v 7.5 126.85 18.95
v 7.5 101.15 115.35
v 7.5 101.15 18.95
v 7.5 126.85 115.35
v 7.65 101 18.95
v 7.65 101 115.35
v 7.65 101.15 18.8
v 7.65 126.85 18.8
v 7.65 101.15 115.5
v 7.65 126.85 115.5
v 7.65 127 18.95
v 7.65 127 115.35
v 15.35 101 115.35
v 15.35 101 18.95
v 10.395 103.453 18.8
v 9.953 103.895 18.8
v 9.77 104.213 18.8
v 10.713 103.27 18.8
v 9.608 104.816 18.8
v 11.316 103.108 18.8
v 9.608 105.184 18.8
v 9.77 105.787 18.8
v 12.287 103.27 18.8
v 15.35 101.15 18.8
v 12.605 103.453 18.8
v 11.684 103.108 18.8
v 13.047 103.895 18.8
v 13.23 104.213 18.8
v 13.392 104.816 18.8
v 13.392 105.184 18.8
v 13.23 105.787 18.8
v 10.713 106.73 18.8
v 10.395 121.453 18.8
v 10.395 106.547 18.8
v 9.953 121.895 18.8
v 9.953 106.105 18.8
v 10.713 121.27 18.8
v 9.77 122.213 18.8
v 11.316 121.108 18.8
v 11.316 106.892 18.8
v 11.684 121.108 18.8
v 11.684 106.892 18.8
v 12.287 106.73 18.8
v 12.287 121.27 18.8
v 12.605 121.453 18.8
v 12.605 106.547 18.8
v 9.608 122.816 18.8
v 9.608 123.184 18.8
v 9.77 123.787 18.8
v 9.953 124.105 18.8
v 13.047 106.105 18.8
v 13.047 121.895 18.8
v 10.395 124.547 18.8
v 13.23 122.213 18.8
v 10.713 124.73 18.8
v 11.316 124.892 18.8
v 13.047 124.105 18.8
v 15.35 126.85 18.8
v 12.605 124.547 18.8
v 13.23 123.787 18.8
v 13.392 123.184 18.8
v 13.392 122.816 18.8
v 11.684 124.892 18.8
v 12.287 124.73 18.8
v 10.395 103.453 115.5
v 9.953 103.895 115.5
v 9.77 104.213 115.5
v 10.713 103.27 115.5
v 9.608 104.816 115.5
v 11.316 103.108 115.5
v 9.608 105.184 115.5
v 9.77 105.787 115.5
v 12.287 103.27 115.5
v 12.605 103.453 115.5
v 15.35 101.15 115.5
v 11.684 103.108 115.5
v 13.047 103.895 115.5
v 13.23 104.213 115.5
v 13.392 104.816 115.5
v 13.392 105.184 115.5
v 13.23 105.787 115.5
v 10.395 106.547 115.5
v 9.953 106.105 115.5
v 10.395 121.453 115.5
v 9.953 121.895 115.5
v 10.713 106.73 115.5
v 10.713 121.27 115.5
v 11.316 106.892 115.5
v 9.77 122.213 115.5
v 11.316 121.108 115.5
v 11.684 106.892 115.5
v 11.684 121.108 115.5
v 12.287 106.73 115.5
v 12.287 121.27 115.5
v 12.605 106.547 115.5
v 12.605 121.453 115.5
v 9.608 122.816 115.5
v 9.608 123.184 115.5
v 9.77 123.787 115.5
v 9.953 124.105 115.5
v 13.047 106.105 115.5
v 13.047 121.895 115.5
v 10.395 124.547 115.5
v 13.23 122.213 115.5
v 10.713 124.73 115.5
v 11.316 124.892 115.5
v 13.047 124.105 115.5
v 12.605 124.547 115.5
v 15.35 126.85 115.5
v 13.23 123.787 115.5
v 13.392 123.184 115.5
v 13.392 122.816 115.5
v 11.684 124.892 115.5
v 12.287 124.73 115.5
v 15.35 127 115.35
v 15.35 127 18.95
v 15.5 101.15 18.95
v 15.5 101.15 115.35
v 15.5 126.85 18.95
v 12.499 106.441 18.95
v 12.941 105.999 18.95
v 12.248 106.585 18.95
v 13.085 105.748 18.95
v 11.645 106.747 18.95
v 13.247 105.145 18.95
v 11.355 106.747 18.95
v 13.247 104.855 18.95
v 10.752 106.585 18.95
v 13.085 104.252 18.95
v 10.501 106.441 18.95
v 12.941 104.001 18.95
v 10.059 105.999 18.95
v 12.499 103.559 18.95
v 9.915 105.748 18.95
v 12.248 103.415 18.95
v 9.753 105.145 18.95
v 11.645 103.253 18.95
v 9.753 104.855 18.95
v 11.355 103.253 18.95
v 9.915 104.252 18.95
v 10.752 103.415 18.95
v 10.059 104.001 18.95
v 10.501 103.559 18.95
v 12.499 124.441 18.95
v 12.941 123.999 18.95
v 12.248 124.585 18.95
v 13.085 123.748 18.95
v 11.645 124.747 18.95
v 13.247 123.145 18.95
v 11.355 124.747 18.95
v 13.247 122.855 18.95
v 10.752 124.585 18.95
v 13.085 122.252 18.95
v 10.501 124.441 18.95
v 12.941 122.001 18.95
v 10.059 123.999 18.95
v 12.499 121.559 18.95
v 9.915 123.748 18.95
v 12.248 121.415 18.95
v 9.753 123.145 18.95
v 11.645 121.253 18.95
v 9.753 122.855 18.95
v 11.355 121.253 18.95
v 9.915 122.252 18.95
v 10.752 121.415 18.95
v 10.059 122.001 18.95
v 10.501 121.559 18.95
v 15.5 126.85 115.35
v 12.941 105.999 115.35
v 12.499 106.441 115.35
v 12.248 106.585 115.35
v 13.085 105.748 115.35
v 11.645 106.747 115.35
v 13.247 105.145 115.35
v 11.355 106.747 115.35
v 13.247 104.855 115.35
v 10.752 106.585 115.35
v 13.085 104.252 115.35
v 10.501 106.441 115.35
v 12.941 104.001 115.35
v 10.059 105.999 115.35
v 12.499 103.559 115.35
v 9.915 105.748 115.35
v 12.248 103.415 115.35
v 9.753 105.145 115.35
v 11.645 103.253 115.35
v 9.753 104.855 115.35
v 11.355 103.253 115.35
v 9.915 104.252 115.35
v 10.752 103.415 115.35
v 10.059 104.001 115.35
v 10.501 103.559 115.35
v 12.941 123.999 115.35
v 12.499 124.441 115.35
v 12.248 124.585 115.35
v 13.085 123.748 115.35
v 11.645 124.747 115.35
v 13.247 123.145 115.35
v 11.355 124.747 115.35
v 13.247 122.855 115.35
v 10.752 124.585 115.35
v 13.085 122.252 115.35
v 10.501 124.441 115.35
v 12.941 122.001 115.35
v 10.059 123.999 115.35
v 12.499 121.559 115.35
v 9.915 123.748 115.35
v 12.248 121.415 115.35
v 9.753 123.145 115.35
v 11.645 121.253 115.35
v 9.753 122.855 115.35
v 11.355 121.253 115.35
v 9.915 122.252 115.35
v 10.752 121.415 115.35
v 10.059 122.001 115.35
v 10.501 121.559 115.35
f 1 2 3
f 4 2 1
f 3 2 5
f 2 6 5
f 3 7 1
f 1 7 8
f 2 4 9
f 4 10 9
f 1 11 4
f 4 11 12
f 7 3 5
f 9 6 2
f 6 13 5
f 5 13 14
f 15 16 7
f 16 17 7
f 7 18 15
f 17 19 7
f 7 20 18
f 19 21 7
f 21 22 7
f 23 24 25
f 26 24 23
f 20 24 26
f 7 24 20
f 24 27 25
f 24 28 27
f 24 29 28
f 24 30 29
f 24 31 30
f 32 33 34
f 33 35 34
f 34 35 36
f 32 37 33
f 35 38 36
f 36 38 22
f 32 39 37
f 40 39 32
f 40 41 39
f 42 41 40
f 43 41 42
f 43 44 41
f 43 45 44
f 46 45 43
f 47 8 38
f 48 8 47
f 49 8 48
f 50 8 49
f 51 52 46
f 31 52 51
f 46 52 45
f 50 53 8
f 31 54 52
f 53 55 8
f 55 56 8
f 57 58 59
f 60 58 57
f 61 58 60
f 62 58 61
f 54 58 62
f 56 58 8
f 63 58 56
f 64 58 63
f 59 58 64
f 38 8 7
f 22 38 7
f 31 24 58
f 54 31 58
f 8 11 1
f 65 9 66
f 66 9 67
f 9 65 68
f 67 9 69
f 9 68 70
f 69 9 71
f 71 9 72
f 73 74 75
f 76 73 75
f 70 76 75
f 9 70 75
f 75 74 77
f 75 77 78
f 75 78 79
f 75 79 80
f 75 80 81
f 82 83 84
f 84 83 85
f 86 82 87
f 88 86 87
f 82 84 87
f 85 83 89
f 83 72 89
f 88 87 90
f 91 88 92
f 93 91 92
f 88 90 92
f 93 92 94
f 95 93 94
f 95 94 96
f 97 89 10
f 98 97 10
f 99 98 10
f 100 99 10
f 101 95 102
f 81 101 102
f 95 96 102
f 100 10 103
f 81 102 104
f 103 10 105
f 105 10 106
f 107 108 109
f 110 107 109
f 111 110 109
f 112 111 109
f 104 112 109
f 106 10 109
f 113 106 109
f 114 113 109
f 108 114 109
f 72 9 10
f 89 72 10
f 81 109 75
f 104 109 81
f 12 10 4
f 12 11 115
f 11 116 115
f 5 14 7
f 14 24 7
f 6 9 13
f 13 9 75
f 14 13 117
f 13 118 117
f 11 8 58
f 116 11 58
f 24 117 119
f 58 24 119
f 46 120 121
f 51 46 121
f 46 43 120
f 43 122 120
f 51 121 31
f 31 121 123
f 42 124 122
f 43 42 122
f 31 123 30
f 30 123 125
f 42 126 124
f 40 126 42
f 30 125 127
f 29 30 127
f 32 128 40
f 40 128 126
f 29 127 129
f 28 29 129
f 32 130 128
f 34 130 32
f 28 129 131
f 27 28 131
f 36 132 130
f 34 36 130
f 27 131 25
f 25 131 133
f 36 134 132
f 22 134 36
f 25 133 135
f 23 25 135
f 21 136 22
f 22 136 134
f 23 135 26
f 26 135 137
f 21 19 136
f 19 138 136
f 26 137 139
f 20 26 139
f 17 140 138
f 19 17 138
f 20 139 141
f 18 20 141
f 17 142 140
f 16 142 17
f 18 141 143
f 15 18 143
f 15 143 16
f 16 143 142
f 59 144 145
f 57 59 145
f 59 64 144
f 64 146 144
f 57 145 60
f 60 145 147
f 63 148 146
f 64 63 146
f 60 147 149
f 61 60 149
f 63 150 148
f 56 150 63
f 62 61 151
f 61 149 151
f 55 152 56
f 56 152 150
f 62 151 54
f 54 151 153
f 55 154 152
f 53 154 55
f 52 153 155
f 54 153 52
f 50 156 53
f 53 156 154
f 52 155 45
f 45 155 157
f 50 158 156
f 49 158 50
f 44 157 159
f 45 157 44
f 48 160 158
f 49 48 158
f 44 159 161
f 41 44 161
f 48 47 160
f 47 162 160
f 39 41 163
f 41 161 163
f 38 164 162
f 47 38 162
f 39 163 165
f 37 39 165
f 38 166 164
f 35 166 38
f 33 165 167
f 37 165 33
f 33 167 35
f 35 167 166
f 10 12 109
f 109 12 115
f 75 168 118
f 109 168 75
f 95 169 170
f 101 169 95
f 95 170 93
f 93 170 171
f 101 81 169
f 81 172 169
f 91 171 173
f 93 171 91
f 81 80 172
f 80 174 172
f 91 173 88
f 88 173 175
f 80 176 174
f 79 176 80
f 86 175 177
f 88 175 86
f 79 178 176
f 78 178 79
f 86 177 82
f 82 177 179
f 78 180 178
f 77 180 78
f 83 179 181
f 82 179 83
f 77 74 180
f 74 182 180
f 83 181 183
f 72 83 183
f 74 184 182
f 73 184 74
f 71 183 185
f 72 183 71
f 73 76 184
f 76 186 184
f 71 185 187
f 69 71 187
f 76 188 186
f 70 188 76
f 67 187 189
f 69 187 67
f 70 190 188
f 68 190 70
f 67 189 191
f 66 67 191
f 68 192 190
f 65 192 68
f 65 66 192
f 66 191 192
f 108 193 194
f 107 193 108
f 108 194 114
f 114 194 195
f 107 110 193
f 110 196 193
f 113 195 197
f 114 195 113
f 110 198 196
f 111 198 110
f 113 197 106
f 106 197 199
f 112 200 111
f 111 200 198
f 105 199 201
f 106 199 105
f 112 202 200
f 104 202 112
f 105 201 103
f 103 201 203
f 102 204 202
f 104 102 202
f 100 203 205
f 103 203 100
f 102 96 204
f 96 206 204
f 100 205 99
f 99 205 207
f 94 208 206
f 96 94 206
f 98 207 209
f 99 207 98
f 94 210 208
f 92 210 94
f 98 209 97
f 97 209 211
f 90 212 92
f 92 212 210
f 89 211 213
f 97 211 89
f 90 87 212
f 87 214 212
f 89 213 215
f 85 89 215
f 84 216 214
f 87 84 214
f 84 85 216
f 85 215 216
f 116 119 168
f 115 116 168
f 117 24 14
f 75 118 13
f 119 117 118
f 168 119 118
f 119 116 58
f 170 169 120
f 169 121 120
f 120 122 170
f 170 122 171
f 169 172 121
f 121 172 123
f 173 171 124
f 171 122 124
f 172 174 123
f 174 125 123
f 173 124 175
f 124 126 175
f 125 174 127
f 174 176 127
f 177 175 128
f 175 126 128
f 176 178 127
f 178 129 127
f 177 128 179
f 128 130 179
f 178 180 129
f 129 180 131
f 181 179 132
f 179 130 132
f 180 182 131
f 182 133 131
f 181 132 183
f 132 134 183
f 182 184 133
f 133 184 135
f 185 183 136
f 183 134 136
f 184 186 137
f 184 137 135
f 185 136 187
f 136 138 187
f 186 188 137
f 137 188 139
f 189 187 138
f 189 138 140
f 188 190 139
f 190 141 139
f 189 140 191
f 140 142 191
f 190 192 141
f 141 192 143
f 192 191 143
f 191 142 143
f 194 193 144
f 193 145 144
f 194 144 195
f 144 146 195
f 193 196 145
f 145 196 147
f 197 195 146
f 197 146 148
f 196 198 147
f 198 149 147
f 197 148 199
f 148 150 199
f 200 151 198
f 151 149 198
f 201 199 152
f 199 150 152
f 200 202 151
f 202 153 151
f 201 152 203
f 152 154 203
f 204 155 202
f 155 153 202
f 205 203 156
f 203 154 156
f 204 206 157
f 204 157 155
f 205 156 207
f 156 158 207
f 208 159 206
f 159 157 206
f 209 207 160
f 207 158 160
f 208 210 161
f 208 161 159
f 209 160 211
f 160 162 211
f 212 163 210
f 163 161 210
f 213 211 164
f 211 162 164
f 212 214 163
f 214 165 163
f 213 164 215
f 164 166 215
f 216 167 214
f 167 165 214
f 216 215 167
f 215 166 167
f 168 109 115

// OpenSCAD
// Generated from the same CSG operations as STEP. Rebuild with spec/build_parent_hand_service.py.
polyhedron(points=[[7.5, 101.1500015258789, 18.950000762939453], [7.5, 101.1500015258789, 115.3499984741211], [7.5, 126.8499984741211, 18.950000762939453], [7.5, 126.8499984741211, 115.3499984741211], [7.650000095367432, 101.0, 18.950000762939453], [7.650000095367432, 101.0, 115.3499984741211], [7.650000095367432, 101.1500015258789, 18.799999237060547], [7.650000095367432, 126.8499984741211, 18.799999237060547], [7.650000095367432, 101.1500015258789, 115.5], [7.650000095367432, 126.8499984741211, 115.5], [7.650000095367432, 127.0, 18.950000762939453], [7.650000095367432, 127.0, 115.3499984741211], [15.350000381469727, 101.0, 115.3499984741211], [15.350000381469727, 101.0, 18.950000762939453], [9.953407287597656, 103.89494323730469, 18.799999237060547], [10.394942283630371, 103.45340728759766, 18.799999237060547], [9.769695281982422, 104.21314239501953, 18.799999237060547], [10.713140487670898, 103.26969909667969, 18.799999237060547], [9.60808277130127, 104.81629180908203, 18.799999237060547], [11.316287994384766, 103.10808563232422, 18.799999237060547], [9.60808277130127, 105.18370819091797, 18.799999237060547], [9.769695281982422, 105.78685760498047, 18.799999237060547], [12.605057716369629, 103.45340728759766, 18.799999237060547], [15.350000381469727, 101.1500015258789, 18.799999237060547], [12.286859512329102, 103.26969909667969, 18.799999237060547], [11.683712005615234, 103.10808563232422, 18.799999237060547], [13.046592712402344, 103.89494323730469, 18.799999237060547], [13.230304718017578, 104.21314239501953, 18.799999237060547], [13.39191722869873, 104.81629180908203, 18.799999237060547], [13.39191722869873, 105.18370819091797, 18.799999237060547], [13.230304718017578, 105.78685760498047, 18.799999237060547], [10.394942283630371, 106.54659271240234, 18.799999237060547], [10.394942283630371, 121.45340728759766, 18.799999237060547], [10.713140487670898, 106.73030090332031, 18.799999237060547], [9.953407287597656, 121.89494323730469, 18.799999237060547], [9.953407287597656, 106.10505676269531, 18.799999237060547], [10.713140487670898, 121.26969909667969, 18.799999237060547], [9.769695281982422, 122.21314239501953, 18.799999237060547], [11.316287994384766, 121.10808563232422, 18.799999237060547], [11.316287994384766, 106.89191436767578, 18.799999237060547], [11.683712005615234, 121.10808563232422, 18.799999237060547], [11.683712005615234, 106.89191436767578, 18.799999237060547], [12.286859512329102, 106.73030090332031, 18.799999237060547], [12.286859512329102, 121.26969909667969, 18.799999237060547], [12.605057716369629, 121.45340728759766, 18.799999237060547], [12.605057716369629, 106.54659271240234, 18.799999237060547], [9.60808277130127, 122.81629180908203, 18.799999237060547], [9.60808277130127, 123.18370819091797, 18.799999237060547], [9.769695281982422, 123.78685760498047, 18.799999237060547], [9.953407287597656, 124.10505676269531, 18.799999237060547], [13.046592712402344, 121.89494323730469, 18.799999237060547], [13.046592712402344, 106.10505676269531, 18.799999237060547], [10.394942283630371, 124.54659271240234, 18.799999237060547], [13.230304718017578, 122.21314239501953, 18.799999237060547], [10.713140487670898, 124.73030090332031, 18.799999237060547], [11.316287994384766, 124.89191436767578, 18.799999237060547], [12.605057716369629, 124.54659271240234, 18.799999237060547], [15.350000381469727, 126.8499984741211, 18.799999237060547], [13.046592712402344, 124.10505676269531, 18.799999237060547], [13.230304718017578, 123.78685760498047, 18.799999237060547], [13.39191722869873, 123.18370819091797, 18.799999237060547], [13.39191722869873, 122.81629180908203, 18.799999237060547], [11.683712005615234, 124.89191436767578, 18.799999237060547], [12.286859512329102, 124.73030090332031, 18.799999237060547], [9.953407287597656, 103.89494323730469, 115.5], [10.394942283630371, 103.45340728759766, 115.5], [9.769695281982422, 104.21314239501953, 115.5], [10.713140487670898, 103.26969909667969, 115.5], [9.60808277130127, 104.81629180908203, 115.5], [11.316287994384766, 103.10808563232422, 115.5], [9.60808277130127, 105.18370819091797, 115.5], [9.769695281982422, 105.78685760498047, 115.5], [15.350000381469727, 101.1500015258789, 115.5], [12.605057716369629, 103.45340728759766, 115.5], [12.286859512329102, 103.26969909667969, 115.5], [11.683712005615234, 103.10808563232422, 115.5], [13.046592712402344, 103.89494323730469, 115.5], [13.230304718017578, 104.21314239501953, 115.5], [13.39191722869873, 104.81629180908203, 115.5], [13.39191722869873, 105.18370819091797, 115.5], [13.230304718017578, 105.78685760498047, 115.5], [10.394942283630371, 121.45340728759766, 115.5], [9.953407287597656, 106.10505676269531, 115.5], [10.394942283630371, 106.54659271240234, 115.5], [9.953407287597656, 121.89494323730469, 115.5], [10.713140487670898, 121.26969909667969, 115.5], [10.713140487670898, 106.73030090332031, 115.5], [11.316287994384766, 106.89191436767578, 115.5], [9.769695281982422, 122.21314239501953, 115.5], [11.316287994384766, 121.10808563232422, 115.5], [11.683712005615234, 121.10808563232422, 115.5], [11.683712005615234, 106.89191436767578, 115.5], [12.286859512329102, 106.73030090332031, 115.5], [12.286859512329102, 121.26969909667969, 115.5], [12.605057716369629, 106.54659271240234, 115.5], [12.605057716369629, 121.45340728759766, 115.5], [9.60808277130127, 122.81629180908203, 115.5], [9.60808277130127, 123.18370819091797, 115.5], [9.769695281982422, 123.78685760498047, 115.5], [9.953407287597656, 124.10505676269531, 115.5], [13.046592712402344, 121.89494323730469, 115.5], [13.046592712402344, 106.10505676269531, 115.5], [10.394942283630371, 124.54659271240234, 115.5], [13.230304718017578, 122.21314239501953, 115.5], [10.713140487670898, 124.73030090332031, 115.5], [11.316287994384766, 124.89191436767578, 115.5], [15.350000381469727, 126.8499984741211, 115.5], [12.605057716369629, 124.54659271240234, 115.5], [13.046592712402344, 124.10505676269531, 115.5], [13.230304718017578, 123.78685760498047, 115.5], [13.39191722869873, 123.18370819091797, 115.5], [13.39191722869873, 122.81629180908203, 115.5], [11.683712005615234, 124.89191436767578, 115.5], [12.286859512329102, 124.73030090332031, 115.5], [15.350000381469727, 127.0, 115.3499984741211], [15.350000381469727, 127.0, 18.950000762939453], [15.5, 101.1500015258789, 18.950000762939453], [15.5, 101.1500015258789, 115.3499984741211], [15.5, 126.8499984741211, 18.950000762939453], [12.940526962280273, 105.99899291992188, 18.950000762939453], [12.498991966247559, 106.4405288696289, 18.950000762939453], [12.24803638458252, 106.58541870117188, 18.950000762939453], [13.085415840148926, 105.74803924560547, 18.950000762939453], [11.644888877868652, 106.74703216552734, 18.950000762939453], [13.247028350830078, 105.14488983154297, 18.950000762939453], [11.355111122131348, 106.74703216552734, 18.950000762939453], [13.247028350830078, 104.85511016845703, 18.950000762939453], [10.75196361541748, 106.58541870117188, 18.950000762939453], [13.085415840148926, 104.25196075439453, 18.950000762939453], [10.501008033752441, 106.4405288696289, 18.950000762939453], [12.940526962280273, 104.00100708007812, 18.950000762939453], [10.059473037719727, 105.99899291992188, 18.950000762939453], [12.498991966247559, 103.5594711303711, 18.950000762939453], [9.914584159851074, 105.74803924560547, 18.950000762939453], [12.24803638458252, 103.41458129882812, 18.950000762939453], [9.752971649169922, 105.14488983154297, 18.950000762939453], [11.644888877868652, 103.25296783447266, 18.950000762939453], [9.752971649169922, 104.85511016845703, 18.950000762939453], [11.355111122131348, 103.25296783447266, 18.950000762939453], [9.914584159851074, 104.25196075439453, 18.950000762939453], [10.75196361541748, 103.41458129882812, 18.950000762939453], [10.059473037719727, 104.00100708007812, 18.950000762939453], [10.501008033752441, 103.5594711303711, 18.950000762939453], [12.940526962280273, 123.99899291992188, 18.950000762939453], [12.498991966247559, 124.4405288696289, 18.950000762939453], [12.24803638458252, 124.58541870117188, 18.950000762939453], [13.085415840148926, 123.74803924560547, 18.950000762939453], [11.644888877868652, 124.74703216552734, 18.950000762939453], [13.247028350830078, 123.14488983154297, 18.950000762939453], [11.355111122131348, 124.74703216552734, 18.950000762939453], [13.247028350830078, 122.85511016845703, 18.950000762939453], [10.75196361541748, 124.58541870117188, 18.950000762939453], [13.085415840148926, 122.25196075439453, 18.950000762939453], [10.501008033752441, 124.4405288696289, 18.950000762939453], [12.940526962280273, 122.00100708007812, 18.950000762939453], [10.059473037719727, 123.99899291992188, 18.950000762939453], [12.498991966247559, 121.5594711303711, 18.950000762939453], [9.914584159851074, 123.74803924560547, 18.950000762939453], [12.24803638458252, 121.41458129882812, 18.950000762939453], [9.752971649169922, 123.14488983154297, 18.950000762939453], [11.644888877868652, 121.25296783447266, 18.950000762939453], [9.752971649169922, 122.85511016845703, 18.950000762939453], [11.355111122131348, 121.25296783447266, 18.950000762939453], [9.914584159851074, 122.25196075439453, 18.950000762939453], [10.75196361541748, 121.41458129882812, 18.950000762939453], [10.059473037719727, 122.00100708007812, 18.950000762939453], [10.501008033752441, 121.5594711303711, 18.950000762939453], [15.5, 126.8499984741211, 115.3499984741211], [12.498991966247559, 106.4405288696289, 115.3499984741211], [12.940526962280273, 105.99899291992188, 115.3499984741211], [12.24803638458252, 106.58541870117188, 115.3499984741211], [13.085415840148926, 105.74803924560547, 115.3499984741211], [11.644888877868652, 106.74703216552734, 115.3499984741211], [13.247028350830078, 105.14488983154297, 115.3499984741211], [11.355111122131348, 106.74703216552734, 115.3499984741211], [13.247028350830078, 104.85511016845703, 115.3499984741211], [10.75196361541748, 106.58541870117188, 115.3499984741211], [13.085415840148926, 104.25196075439453, 115.3499984741211], [10.501008033752441, 106.4405288696289, 115.3499984741211], [12.940526962280273, 104.00100708007812, 115.3499984741211], [10.059473037719727, 105.99899291992188, 115.3499984741211], [12.498991966247559, 103.5594711303711, 115.3499984741211], [9.914584159851074, 105.74803924560547, 115.3499984741211], [12.24803638458252, 103.41458129882812, 115.3499984741211], [9.752971649169922, 105.14488983154297, 115.3499984741211], [11.644888877868652, 103.25296783447266, 115.3499984741211], [9.752971649169922, 104.85511016845703, 115.3499984741211], [11.355111122131348, 103.25296783447266, 115.3499984741211], [9.914584159851074, 104.25196075439453, 115.3499984741211], [10.75196361541748, 103.41458129882812, 115.3499984741211], [10.059473037719727, 104.00100708007812, 115.3499984741211], [10.501008033752441, 103.5594711303711, 115.3499984741211], [12.498991966247559, 124.4405288696289, 115.3499984741211], [12.940526962280273, 123.99899291992188, 115.3499984741211], [12.24803638458252, 124.58541870117188, 115.3499984741211], [13.085415840148926, 123.74803924560547, 115.3499984741211], [11.644888877868652, 124.74703216552734, 115.3499984741211], [13.247028350830078, 123.14488983154297, 115.3499984741211], [11.355111122131348, 124.74703216552734, 115.3499984741211], [13.247028350830078, 122.85511016845703, 115.3499984741211], [10.75196361541748, 124.58541870117188, 115.3499984741211], [13.085415840148926, 122.25196075439453, 115.3499984741211], [10.501008033752441, 124.4405288696289, 115.3499984741211], [12.940526962280273, 122.00100708007812, 115.3499984741211], [10.059473037719727, 123.99899291992188, 115.3499984741211], [12.498991966247559, 121.5594711303711, 115.3499984741211], [9.914584159851074, 123.74803924560547, 115.3499984741211], [12.24803638458252, 121.41458129882812, 115.3499984741211], [9.752971649169922, 123.14488983154297, 115.3499984741211], [11.644888877868652, 121.25296783447266, 115.3499984741211], [9.752971649169922, 122.85511016845703, 115.3499984741211], [11.355111122131348, 121.25296783447266, 115.3499984741211], [9.914584159851074, 122.25196075439453, 115.3499984741211], [10.75196361541748, 121.41458129882812, 115.3499984741211], [10.059473037719727, 122.00100708007812, 115.3499984741211], [10.501008033752441, 121.5594711303711, 115.3499984741211]],faces=[[0, 1, 2], [2, 1, 3], [4, 1, 0], [4, 5, 1], [2, 6, 0], [7, 6, 2], [8, 3, 1], [8, 9, 3], [3, 10, 2], [11, 10, 3], [4, 0, 6], [1, 5, 8], [4, 12, 5], [13, 12, 4], [6, 14, 15], [6, 16, 14], [15, 17, 6], [6, 18, 16], [17, 19, 6], [6, 20, 18], [6, 21, 20], [22, 23, 24], [24, 23, 25], [25, 23, 19], [19, 23, 6], [22, 26, 23], [26, 27, 23], [27, 28, 23], [28, 29, 23], [29, 30, 23], [31, 32, 33], [31, 34, 32], [35, 34, 31], [32, 36, 33], [35, 37, 34], [21, 37, 35], [36, 38, 33], [33, 38, 39], [38, 40, 39], [39, 40, 41], [41, 40, 42], [40, 43, 42], [43, 44, 42], [42, 44, 45], [37, 7, 46], [46, 7, 47], [47, 7, 48], [48, 7, 49], [45, 50, 51], [51, 50, 30], [44, 50, 45], [7, 52, 49], [50, 53, 30], [7, 54, 52], [7, 55, 54], [56, 57, 58], [58, 57, 59], [59, 57, 60], [60, 57, 61], [61, 57, 53], [7, 57, 55], [55, 57, 62], [62, 57, 63], [63, 57, 56], [6, 7, 37], [6, 37, 21], [57, 23, 30], [57, 30, 53], [2, 10, 7], [64, 8, 65], [66, 8, 64], [67, 65, 8], [68, 8, 66], [69, 67, 8], [70, 8, 68], [71, 8, 70], [72, 73, 74], [72, 74, 75], [72, 75, 69], [72, 69, 8], [76, 73, 72], [77, 76, 72], [78, 77, 72], [79, 78, 72], [80, 79, 72], [81, 82, 83], [84, 82, 81], [85, 83, 86], [85, 86, 87], [85, 81, 83], [88, 82, 84], [88, 71, 82], [89, 85, 87], [90, 87, 91], [90, 91, 92], [90, 89, 87], [93, 90, 92], [93, 92, 94], [95, 93, 94], [9, 88, 96], [9, 96, 97], [9, 97, 98], [9, 98, 99], [100, 94, 101], [100, 101, 80], [100, 95, 94], [102, 9, 99], [103, 100, 80], [104, 9, 102], [105, 9, 104], [106, 107, 108], [106, 108, 109], [106, 109, 110], [106, 110, 111], [106, 111, 103], [106, 9, 105], [106, 105, 112], [106, 112, 113], [106, 113, 107], [9, 8, 71], [9, 71, 88], [72, 106, 80], [80, 106, 103], [3, 9, 11], [114, 10, 11], [114, 115, 10], [6, 13, 4], [6, 23, 13], [12, 8, 5], [72, 8, 12], [116, 12, 13], [116, 117, 12], [57, 7, 10], [57, 10, 115], [118, 116, 23], [118, 23, 57], [119, 120, 45], [119, 45, 51], [120, 42, 45], [120, 121, 42], [30, 119, 51], [122, 119, 30], [121, 123, 41], [121, 41, 42], [29, 122, 30], [124, 122, 29], [123, 125, 41], [41, 125, 39], [126, 124, 29], [126, 29, 28], [39, 127, 33], [125, 127, 39], [128, 126, 28], [128, 28, 27], [127, 129, 33], [33, 129, 31], [130, 128, 27], [130, 27, 26], [129, 131, 35], [129, 35, 31], [22, 130, 26], [132, 130, 22], [131, 133, 35], [35, 133, 21], [134, 132, 22], [134, 22, 24], [21, 135, 20], [133, 135, 21], [25, 134, 24], [136, 134, 25], [135, 18, 20], [135, 137, 18], [138, 136, 25], [138, 25, 19], [137, 139, 16], [137, 16, 18], [140, 138, 19], [140, 19, 17], [139, 141, 16], [16, 141, 14], [142, 140, 17], [142, 17, 15], [14, 142, 15], [141, 142, 14], [143, 144, 56], [143, 56, 58], [144, 63, 56], [144, 145, 63], [59, 143, 58], [146, 143, 59], [145, 147, 62], [145, 62, 63], [148, 146, 59], [148, 59, 60], [147, 149, 62], [62, 149, 55], [150, 60, 61], [150, 148, 60], [55, 151, 54], [149, 151, 55], [53, 150, 61], [152, 150, 53], [151, 153, 54], [54, 153, 52], [154, 152, 50], [50, 152, 53], [52, 155, 49], [153, 155, 52], [44, 154, 50], [156, 154, 44], [155, 157, 49], [49, 157, 48], [158, 156, 43], [43, 156, 44], [157, 159, 47], [157, 47, 48], [160, 158, 43], [160, 43, 40], [159, 46, 47], [159, 161, 46], [162, 40, 38], [162, 160, 40], [161, 163, 37], [161, 37, 46], [164, 162, 38], [164, 38, 36], [163, 165, 37], [37, 165, 34], [166, 164, 32], [32, 164, 36], [34, 166, 32], [165, 166, 34], [106, 11, 9], [114, 11, 106], [117, 167, 72], [72, 167, 106], [168, 169, 94], [94, 169, 101], [92, 168, 94], [170, 168, 92], [169, 80, 101], [169, 171, 80], [172, 170, 91], [91, 170, 92], [171, 79, 80], [171, 173, 79], [87, 172, 91], [174, 172, 87], [173, 175, 79], [79, 175, 78], [176, 174, 86], [86, 174, 87], [175, 177, 78], [78, 177, 77], [83, 176, 86], [178, 176, 83], [177, 179, 77], [77, 179, 76], [180, 178, 82], [82, 178, 83], [179, 73, 76], [179, 181, 73], [182, 180, 82], [182, 82, 71], [181, 183, 73], [73, 183, 74], [184, 182, 70], [70, 182, 71], [183, 75, 74], [183, 185, 75], [186, 184, 70], [186, 70, 68], [185, 187, 75], [75, 187, 69], [188, 186, 66], [66, 186, 68], [187, 189, 69], [69, 189, 67], [190, 188, 66], [190, 66, 64], [189, 191, 67], [67, 191, 65], [191, 64, 65], [191, 190, 64], [192, 193, 107], [107, 193, 108], [113, 192, 107], [194, 192, 113], [193, 109, 108], [193, 195, 109], [196, 194, 112], [112, 194, 113], [195, 197, 109], [109, 197, 110], [105, 196, 112], [198, 196, 105], [110, 199, 111], [197, 199, 110], [200, 198, 104], [104, 198, 105], [199, 201, 111], [111, 201, 103], [102, 200, 104], [202, 200, 102], [201, 203, 100], [201, 100, 103], [204, 202, 99], [99, 202, 102], [203, 95, 100], [203, 205, 95], [98, 204, 99], [206, 204, 98], [205, 207, 93], [205, 93, 95], [208, 206, 97], [97, 206, 98], [207, 209, 93], [93, 209, 90], [96, 208, 97], [210, 208, 96], [90, 211, 89], [209, 211, 90], [212, 210, 88], [88, 210, 96], [211, 85, 89], [211, 213, 85], [214, 212, 88], [214, 88, 84], [213, 215, 81], [213, 81, 85], [215, 84, 81], [215, 214, 84], [167, 118, 115], [167, 115, 114], [13, 23, 116], [12, 117, 72], [117, 116, 118], [117, 118, 167], [57, 115, 118], [120, 169, 168], [120, 119, 169], [168, 121, 120], [170, 121, 168], [119, 171, 169], [122, 171, 119], [123, 170, 172], [123, 121, 170], [122, 173, 171], [122, 124, 173], [174, 123, 172], [174, 125, 123], [126, 173, 124], [126, 175, 173], [127, 174, 176], [127, 125, 174], [126, 177, 175], [126, 128, 177], [178, 127, 176], [178, 129, 127], [128, 179, 177], [130, 179, 128], [131, 178, 180], [131, 129, 178], [130, 181, 179], [130, 132, 181], [182, 131, 180], [182, 133, 131], [132, 183, 181], [134, 183, 132], [135, 182, 184], [135, 133, 182], [136, 185, 183], [134, 136, 183], [186, 135, 184], [186, 137, 135], [136, 187, 185], [138, 187, 136], [137, 186, 188], [139, 137, 188], [138, 189, 187], [138, 140, 189], [190, 139, 188], [190, 141, 139], [140, 191, 189], [142, 191, 140], [142, 190, 191], [142, 141, 190], [144, 193, 192], [144, 143, 193], [194, 144, 192], [194, 145, 144], [143, 195, 193], [146, 195, 143], [145, 194, 196], [147, 145, 196], [146, 197, 195], [146, 148, 197], [198, 147, 196], [198, 149, 147], [197, 150, 199], [197, 148, 150], [151, 198, 200], [151, 149, 198], [150, 201, 199], [150, 152, 201], [202, 151, 200], [202, 153, 151], [201, 154, 203], [201, 152, 154], [155, 202, 204], [155, 153, 202], [156, 205, 203], [154, 156, 203], [206, 155, 204], [206, 157, 155], [205, 158, 207], [205, 156, 158], [159, 206, 208], [159, 157, 206], [160, 209, 207], [158, 160, 207], [210, 159, 208], [210, 161, 159], [209, 162, 211], [209, 160, 162], [163, 210, 212], [163, 161, 210], [162, 213, 211], [162, 164, 213], [214, 163, 212], [214, 165, 163], [213, 166, 215], [213, 164, 166], [166, 214, 215], [166, 165, 214], [114, 106, 167]],convexity=10);
